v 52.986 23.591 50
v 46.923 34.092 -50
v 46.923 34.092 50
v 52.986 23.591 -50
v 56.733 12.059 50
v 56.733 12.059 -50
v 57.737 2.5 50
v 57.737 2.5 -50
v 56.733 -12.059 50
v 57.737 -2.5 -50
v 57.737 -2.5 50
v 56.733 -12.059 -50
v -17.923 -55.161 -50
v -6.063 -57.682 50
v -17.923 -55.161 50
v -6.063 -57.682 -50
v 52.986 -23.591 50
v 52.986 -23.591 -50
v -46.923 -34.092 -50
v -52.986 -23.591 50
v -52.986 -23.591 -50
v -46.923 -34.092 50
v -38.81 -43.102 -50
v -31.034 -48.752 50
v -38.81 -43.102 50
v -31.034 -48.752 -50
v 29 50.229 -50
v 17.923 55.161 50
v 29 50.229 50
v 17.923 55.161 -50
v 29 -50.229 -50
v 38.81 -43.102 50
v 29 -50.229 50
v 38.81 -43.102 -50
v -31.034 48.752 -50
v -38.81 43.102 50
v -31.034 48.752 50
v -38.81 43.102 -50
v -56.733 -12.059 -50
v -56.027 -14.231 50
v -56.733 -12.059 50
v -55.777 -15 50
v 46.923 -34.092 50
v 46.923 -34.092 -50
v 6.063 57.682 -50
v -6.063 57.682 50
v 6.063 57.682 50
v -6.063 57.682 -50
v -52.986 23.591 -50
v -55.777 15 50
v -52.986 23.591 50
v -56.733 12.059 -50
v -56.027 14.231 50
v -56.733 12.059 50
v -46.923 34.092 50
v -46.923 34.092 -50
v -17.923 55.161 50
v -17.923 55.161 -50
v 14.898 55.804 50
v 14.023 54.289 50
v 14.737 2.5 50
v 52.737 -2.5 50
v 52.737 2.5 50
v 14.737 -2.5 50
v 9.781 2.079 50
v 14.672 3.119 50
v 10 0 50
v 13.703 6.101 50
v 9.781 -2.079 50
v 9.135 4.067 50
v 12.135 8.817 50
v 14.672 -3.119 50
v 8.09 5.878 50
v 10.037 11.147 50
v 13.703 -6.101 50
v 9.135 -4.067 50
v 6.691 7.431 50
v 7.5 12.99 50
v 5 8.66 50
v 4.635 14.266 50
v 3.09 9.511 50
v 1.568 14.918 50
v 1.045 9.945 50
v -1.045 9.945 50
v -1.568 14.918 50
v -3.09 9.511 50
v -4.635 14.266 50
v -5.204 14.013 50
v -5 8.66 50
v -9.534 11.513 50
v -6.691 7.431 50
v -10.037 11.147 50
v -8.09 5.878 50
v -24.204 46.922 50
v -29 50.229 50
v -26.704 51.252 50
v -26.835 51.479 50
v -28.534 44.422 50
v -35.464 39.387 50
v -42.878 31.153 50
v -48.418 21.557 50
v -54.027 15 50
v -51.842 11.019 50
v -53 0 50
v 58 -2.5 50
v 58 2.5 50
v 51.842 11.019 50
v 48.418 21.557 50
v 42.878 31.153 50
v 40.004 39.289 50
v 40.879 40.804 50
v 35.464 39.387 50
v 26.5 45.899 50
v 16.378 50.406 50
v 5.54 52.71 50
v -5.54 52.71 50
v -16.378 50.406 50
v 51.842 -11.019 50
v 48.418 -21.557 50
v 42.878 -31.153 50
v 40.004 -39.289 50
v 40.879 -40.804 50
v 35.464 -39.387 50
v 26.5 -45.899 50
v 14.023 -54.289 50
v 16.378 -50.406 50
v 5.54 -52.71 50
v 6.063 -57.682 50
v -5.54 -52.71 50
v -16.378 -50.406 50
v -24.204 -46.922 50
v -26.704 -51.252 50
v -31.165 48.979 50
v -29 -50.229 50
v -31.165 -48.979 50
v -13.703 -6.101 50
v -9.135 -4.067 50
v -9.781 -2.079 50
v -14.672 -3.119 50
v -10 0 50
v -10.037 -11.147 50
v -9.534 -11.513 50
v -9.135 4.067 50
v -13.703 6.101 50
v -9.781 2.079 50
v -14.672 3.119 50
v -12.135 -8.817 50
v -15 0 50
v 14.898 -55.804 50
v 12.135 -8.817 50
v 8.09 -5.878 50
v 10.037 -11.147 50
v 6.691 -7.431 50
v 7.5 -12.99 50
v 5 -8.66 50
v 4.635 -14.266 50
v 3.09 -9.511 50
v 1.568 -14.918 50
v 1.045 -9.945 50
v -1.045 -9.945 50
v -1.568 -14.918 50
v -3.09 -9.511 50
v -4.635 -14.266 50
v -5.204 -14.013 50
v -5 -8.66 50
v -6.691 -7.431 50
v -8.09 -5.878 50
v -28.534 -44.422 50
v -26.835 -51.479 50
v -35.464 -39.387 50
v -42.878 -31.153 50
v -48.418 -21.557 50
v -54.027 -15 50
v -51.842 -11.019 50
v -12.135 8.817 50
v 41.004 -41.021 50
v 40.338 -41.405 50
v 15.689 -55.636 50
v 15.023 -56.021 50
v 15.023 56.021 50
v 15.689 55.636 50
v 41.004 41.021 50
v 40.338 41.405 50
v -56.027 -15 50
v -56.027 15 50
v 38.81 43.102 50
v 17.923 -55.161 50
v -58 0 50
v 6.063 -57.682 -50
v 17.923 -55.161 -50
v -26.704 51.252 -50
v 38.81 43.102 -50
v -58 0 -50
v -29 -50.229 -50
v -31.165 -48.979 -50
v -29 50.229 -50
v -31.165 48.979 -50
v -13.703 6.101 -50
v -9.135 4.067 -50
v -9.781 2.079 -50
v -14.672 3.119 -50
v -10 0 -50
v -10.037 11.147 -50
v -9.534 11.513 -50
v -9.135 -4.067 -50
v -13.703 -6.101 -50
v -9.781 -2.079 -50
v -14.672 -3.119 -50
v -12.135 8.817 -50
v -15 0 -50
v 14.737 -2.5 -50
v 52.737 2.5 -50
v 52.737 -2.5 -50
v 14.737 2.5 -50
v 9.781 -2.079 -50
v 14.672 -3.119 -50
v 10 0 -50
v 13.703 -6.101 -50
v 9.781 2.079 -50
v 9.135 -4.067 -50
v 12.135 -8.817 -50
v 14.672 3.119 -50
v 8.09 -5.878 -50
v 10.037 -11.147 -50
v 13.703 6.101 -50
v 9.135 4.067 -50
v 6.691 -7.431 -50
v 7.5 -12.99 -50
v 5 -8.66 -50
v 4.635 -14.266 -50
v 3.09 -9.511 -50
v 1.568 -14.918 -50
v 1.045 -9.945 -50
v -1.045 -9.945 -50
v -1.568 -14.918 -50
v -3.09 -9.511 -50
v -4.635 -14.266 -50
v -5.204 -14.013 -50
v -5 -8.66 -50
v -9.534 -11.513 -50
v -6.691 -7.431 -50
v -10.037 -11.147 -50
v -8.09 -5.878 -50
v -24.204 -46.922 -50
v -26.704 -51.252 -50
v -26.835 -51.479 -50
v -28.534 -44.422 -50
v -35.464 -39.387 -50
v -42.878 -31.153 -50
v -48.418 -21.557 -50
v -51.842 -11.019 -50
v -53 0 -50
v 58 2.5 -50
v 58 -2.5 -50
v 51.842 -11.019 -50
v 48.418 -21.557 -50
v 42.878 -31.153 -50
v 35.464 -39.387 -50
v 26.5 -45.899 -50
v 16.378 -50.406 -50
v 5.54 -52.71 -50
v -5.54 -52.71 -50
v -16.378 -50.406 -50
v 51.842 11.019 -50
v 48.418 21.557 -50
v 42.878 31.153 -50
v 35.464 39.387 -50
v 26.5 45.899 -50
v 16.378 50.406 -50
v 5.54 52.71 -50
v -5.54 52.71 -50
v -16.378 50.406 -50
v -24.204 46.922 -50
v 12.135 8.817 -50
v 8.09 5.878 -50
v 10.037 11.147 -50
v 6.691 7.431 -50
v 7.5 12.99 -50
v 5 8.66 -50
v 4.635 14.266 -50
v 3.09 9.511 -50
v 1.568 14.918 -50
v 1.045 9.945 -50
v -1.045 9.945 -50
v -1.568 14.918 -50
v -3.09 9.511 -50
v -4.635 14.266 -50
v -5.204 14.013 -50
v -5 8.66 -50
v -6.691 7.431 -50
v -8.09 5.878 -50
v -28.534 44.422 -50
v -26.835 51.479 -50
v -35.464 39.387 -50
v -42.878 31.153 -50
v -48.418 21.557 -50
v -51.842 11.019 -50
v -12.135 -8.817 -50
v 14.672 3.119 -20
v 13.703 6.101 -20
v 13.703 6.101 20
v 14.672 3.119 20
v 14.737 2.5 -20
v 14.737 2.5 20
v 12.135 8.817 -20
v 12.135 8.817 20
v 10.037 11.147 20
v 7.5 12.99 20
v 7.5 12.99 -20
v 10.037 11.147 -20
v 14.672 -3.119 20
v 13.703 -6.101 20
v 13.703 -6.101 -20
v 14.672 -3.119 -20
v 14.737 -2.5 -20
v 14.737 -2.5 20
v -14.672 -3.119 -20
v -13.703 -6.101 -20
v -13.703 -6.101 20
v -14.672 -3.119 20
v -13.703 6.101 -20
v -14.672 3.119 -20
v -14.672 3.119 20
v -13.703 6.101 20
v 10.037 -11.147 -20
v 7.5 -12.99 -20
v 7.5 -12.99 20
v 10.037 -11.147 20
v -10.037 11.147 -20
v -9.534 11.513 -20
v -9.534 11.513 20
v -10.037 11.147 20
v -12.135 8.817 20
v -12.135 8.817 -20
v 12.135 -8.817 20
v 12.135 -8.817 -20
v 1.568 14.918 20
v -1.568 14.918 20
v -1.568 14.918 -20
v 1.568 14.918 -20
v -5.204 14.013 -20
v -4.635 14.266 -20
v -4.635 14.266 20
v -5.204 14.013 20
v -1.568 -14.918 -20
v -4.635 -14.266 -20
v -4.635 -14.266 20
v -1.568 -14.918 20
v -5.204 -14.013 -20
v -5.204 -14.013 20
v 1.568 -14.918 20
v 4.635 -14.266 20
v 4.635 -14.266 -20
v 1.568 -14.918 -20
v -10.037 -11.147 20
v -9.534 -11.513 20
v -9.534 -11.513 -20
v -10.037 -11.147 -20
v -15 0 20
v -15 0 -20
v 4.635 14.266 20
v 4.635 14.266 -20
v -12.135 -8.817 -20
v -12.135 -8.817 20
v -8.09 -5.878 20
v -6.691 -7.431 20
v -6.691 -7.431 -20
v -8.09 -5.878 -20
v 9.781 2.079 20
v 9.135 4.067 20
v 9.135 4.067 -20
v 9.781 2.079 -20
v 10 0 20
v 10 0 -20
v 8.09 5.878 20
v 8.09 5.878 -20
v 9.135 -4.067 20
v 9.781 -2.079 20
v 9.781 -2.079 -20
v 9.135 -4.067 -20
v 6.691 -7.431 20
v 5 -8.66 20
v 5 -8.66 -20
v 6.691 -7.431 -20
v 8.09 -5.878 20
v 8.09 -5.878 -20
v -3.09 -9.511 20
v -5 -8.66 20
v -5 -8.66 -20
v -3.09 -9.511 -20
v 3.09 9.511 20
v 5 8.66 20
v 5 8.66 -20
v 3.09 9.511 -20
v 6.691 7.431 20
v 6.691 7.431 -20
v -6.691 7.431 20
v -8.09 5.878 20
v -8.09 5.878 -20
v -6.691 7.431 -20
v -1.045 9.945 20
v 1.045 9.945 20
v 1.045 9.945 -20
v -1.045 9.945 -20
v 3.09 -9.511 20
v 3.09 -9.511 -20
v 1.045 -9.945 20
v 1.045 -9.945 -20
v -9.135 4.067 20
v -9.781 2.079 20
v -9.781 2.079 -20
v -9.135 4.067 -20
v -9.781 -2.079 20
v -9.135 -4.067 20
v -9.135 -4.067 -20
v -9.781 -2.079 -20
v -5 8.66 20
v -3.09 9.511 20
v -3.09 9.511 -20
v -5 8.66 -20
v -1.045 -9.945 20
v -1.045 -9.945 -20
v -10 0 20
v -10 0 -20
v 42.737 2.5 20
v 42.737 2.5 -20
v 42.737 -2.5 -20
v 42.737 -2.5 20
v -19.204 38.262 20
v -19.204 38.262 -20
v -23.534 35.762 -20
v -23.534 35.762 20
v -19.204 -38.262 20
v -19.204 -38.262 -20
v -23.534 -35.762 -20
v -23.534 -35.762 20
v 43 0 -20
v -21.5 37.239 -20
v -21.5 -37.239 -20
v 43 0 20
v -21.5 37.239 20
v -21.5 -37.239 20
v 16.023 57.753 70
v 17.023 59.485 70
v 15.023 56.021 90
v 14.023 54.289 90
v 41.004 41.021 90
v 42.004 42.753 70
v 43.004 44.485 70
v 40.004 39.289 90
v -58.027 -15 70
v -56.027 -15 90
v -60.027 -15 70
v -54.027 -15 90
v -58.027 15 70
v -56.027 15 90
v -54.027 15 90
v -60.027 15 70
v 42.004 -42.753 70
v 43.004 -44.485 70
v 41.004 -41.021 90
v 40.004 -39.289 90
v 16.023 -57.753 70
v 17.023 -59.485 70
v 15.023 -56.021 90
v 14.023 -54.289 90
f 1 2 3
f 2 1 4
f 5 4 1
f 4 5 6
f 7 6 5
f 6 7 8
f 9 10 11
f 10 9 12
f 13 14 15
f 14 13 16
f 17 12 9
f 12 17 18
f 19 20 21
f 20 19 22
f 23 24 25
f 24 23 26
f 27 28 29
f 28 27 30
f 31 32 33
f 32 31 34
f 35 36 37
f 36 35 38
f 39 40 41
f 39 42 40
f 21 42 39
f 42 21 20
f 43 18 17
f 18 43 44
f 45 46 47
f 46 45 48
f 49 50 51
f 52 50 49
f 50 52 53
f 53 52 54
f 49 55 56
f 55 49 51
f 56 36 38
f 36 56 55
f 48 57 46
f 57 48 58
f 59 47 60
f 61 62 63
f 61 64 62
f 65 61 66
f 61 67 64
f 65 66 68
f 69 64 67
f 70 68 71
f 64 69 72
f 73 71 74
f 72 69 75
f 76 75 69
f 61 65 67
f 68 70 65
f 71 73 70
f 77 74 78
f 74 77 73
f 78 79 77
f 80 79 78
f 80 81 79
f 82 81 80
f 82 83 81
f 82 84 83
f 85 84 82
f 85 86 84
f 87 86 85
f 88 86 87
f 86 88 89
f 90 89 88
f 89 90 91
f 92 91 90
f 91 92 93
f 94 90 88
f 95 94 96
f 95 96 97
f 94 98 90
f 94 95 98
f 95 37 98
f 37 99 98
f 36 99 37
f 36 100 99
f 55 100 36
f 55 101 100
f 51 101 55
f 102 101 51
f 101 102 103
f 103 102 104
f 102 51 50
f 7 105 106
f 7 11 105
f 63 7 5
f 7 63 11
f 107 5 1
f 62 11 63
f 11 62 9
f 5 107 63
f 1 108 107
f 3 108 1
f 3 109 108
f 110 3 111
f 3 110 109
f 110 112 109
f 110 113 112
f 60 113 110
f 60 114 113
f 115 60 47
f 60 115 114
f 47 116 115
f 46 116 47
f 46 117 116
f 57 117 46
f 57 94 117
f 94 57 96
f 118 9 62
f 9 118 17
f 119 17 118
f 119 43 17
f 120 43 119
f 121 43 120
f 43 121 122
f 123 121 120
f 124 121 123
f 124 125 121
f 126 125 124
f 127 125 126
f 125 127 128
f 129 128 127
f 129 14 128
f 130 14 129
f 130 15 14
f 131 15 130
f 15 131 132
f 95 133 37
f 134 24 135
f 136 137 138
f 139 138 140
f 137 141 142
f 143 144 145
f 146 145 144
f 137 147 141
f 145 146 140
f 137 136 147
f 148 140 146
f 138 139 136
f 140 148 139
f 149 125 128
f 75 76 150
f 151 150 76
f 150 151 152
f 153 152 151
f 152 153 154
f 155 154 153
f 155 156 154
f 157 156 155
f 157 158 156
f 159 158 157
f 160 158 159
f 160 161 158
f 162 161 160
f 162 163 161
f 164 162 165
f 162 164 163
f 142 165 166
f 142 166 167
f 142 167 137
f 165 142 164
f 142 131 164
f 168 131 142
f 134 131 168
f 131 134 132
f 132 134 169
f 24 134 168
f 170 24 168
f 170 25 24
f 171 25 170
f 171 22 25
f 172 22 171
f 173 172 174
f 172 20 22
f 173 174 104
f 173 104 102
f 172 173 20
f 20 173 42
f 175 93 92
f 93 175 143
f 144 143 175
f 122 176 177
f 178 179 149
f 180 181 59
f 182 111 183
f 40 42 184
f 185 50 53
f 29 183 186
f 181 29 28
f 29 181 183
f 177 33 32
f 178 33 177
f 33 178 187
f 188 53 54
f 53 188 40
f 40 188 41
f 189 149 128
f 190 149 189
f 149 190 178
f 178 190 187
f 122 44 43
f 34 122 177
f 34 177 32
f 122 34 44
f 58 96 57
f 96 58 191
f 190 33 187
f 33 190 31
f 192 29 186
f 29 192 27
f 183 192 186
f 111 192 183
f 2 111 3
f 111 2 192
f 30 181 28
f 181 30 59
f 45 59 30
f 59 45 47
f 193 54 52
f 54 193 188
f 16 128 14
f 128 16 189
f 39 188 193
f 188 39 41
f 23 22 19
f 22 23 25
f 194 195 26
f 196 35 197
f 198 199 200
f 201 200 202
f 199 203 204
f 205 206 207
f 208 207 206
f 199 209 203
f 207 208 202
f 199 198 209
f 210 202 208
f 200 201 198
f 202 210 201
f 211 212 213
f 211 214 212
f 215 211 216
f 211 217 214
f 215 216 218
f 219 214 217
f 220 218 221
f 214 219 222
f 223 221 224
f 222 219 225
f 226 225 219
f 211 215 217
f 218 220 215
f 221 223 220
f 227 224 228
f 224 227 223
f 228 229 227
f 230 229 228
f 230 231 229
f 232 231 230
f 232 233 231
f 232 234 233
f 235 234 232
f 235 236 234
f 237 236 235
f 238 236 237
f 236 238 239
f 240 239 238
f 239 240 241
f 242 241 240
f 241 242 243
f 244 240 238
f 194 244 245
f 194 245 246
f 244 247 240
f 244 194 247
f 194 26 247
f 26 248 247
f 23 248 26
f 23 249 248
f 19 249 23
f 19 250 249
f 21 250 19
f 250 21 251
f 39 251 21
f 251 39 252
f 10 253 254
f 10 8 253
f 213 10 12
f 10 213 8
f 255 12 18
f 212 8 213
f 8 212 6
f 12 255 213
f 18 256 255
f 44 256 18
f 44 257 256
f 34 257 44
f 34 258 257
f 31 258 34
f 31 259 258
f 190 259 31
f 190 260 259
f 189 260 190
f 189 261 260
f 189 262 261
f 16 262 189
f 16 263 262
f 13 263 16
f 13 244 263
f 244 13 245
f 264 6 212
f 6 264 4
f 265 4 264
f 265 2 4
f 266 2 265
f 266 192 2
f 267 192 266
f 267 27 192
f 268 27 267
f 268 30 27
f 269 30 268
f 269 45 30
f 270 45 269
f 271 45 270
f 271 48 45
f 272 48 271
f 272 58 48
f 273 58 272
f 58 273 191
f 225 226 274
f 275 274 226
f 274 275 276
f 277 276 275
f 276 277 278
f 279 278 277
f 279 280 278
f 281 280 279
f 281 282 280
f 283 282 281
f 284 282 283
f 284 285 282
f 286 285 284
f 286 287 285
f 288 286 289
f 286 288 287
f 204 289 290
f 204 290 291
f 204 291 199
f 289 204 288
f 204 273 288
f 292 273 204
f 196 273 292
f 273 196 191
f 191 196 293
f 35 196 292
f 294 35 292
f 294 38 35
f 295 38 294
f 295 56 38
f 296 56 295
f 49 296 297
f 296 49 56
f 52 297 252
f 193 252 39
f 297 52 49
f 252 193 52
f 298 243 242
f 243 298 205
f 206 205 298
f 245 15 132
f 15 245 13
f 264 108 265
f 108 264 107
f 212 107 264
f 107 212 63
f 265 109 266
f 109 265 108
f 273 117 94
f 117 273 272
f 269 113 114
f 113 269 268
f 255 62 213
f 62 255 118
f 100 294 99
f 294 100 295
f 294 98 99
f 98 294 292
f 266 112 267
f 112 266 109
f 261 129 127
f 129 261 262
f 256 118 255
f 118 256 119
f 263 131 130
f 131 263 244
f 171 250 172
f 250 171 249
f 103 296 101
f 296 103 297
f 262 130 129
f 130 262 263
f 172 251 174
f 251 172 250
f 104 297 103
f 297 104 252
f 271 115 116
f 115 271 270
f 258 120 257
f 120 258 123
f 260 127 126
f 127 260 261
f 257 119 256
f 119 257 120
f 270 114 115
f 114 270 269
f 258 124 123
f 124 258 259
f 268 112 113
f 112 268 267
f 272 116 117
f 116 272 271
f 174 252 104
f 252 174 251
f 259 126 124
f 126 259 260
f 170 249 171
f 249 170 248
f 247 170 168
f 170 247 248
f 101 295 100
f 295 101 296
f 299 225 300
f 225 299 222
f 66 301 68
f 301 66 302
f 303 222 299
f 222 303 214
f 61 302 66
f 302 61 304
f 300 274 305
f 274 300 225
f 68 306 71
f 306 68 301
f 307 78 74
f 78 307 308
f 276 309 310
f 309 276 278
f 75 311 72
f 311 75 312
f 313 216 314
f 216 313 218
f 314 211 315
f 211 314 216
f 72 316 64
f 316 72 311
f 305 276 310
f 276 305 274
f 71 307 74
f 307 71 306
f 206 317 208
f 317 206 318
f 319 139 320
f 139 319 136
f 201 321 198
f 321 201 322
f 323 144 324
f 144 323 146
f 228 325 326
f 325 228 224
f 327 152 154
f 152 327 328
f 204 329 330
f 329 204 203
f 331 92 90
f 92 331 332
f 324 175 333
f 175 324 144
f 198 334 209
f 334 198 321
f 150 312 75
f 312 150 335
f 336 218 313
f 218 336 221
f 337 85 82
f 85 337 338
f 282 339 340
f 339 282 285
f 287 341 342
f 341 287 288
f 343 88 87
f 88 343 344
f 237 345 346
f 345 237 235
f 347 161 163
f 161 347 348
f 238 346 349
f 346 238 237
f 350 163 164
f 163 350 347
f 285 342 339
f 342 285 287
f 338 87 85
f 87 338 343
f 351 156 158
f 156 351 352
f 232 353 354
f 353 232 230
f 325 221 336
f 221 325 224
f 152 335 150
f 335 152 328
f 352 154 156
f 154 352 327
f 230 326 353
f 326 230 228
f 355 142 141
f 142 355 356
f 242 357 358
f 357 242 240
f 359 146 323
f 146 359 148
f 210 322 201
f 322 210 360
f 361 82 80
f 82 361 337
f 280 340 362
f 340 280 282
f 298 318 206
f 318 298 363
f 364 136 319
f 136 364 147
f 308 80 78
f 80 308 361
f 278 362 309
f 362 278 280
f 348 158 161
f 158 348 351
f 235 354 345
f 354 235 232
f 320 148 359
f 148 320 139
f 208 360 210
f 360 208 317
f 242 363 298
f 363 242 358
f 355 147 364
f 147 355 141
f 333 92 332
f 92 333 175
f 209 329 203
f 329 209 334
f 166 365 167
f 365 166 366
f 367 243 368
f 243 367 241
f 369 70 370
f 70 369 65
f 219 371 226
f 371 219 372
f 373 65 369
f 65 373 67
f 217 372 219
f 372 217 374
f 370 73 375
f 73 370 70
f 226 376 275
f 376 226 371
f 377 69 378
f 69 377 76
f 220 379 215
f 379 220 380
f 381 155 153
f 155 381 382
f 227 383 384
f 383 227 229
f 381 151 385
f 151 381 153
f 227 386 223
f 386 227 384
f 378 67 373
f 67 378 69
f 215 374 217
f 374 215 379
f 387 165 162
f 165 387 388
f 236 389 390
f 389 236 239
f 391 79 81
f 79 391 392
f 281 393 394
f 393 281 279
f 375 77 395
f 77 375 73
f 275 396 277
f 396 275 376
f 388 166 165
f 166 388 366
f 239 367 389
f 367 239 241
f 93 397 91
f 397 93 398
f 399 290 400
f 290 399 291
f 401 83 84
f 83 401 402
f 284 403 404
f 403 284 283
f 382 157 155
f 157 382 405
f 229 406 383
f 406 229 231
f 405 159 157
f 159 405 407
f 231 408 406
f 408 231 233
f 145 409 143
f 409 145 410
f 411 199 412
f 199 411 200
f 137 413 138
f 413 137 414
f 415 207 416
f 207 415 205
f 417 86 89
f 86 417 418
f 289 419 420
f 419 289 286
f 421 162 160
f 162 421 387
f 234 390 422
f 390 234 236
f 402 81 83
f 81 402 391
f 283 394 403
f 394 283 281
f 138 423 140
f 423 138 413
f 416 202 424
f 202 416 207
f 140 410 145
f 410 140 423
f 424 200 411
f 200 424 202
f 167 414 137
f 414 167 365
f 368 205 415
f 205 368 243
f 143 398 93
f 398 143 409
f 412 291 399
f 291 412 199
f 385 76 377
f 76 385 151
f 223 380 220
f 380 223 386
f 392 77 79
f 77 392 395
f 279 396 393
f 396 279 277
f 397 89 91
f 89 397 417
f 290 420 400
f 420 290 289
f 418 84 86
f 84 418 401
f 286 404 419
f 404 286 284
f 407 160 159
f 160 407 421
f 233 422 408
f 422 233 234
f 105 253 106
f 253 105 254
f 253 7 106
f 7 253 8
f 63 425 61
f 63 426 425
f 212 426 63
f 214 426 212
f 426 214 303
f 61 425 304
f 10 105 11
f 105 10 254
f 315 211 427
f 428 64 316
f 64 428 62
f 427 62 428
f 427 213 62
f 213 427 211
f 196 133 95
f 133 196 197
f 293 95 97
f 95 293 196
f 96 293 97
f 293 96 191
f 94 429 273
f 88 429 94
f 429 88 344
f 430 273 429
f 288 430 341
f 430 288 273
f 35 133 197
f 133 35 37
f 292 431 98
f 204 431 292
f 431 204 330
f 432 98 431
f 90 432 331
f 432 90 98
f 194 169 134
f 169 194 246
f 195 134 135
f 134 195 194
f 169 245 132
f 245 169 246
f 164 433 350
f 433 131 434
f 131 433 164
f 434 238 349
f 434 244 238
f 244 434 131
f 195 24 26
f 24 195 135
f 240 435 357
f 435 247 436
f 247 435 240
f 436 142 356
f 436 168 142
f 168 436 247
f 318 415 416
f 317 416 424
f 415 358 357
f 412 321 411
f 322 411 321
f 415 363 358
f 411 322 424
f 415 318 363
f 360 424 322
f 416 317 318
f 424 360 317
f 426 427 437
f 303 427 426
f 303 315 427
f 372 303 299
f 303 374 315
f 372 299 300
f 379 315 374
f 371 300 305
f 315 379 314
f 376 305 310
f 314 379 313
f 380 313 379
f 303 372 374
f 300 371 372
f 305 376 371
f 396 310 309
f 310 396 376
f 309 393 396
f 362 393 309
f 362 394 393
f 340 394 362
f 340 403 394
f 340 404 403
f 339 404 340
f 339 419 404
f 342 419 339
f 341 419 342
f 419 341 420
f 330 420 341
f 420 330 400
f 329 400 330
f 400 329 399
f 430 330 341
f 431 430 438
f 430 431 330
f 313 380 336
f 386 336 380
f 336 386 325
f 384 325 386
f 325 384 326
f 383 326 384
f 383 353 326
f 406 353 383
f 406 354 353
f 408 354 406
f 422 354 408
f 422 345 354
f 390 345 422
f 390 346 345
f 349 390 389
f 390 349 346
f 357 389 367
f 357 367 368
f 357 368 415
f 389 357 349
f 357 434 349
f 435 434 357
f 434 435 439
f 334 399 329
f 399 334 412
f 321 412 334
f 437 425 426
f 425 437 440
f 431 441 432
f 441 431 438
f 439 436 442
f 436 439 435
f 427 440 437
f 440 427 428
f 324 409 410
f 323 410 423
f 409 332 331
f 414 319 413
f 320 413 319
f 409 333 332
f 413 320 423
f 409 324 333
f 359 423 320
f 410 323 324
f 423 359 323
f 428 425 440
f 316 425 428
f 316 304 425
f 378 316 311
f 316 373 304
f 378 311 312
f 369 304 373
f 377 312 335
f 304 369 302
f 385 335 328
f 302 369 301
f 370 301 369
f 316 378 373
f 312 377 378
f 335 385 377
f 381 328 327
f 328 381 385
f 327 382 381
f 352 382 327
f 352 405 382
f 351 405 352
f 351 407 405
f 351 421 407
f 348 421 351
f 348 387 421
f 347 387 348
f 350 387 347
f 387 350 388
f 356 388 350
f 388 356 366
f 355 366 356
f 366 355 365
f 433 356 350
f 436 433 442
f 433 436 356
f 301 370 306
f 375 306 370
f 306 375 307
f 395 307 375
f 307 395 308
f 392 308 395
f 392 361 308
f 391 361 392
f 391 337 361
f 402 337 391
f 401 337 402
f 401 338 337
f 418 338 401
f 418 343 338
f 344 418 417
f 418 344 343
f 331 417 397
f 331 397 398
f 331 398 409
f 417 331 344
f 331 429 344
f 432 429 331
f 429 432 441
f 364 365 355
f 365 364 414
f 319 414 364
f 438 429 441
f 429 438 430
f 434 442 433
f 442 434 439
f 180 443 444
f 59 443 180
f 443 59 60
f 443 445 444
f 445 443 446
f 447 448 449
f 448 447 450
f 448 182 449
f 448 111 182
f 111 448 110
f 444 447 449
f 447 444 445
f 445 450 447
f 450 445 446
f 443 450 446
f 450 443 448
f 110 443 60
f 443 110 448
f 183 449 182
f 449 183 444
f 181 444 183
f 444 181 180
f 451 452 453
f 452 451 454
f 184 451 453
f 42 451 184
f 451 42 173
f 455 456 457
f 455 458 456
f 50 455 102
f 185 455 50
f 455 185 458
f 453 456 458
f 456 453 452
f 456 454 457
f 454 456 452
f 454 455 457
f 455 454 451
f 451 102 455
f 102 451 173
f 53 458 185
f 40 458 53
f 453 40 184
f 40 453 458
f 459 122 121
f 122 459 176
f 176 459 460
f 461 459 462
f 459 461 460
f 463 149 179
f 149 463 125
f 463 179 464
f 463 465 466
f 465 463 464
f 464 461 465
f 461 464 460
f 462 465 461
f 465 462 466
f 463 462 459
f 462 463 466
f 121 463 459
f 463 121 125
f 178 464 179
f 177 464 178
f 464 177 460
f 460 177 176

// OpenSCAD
/*  OpenSCAD input script
 *  Created using Claude AI with lot of instructions and fixes.
 *  
 *  TODO: smooth the springs both vertival and horizontal.
 * 
 */


// SCAD parameter "face number" to approximate ciylinders
$fn = 30;

// Parameters
height = 100;
outer_diameter = 116;
inner_diameter = 20;
wall_thickness = 5;
num_ribs = 3;
cut_diameter = outer_diameter - 30;
rib_height = 30;

// Spring parameters
spring_thickness = 2;
spring_height = 40;
spring_width = 30;
spring_extension = 4;

// Derived parameters
outer_radius = outer_diameter / 2;
inner_radius = inner_diameter / 2;
middle_radius = (outer_radius + inner_radius) / 2;
cut_radius = cut_diameter / 2;

// Calculated spring position
function chord_height(r, w) = r - sqrt(r*r - (w/2)*(w/2));
spring_chord_height = chord_height(outer_radius, spring_width);
spring_offset = outer_radius - spring_thickness/2 - spring_chord_height;

// Outer cylinder shell
module outer_shell() {
    difference() {
        cylinder(h = height, r = outer_radius, center = true);
        cylinder(h = height + 1, r = outer_radius - wall_thickness, center = true);
    }
}

// Inner cylinder shell
module inner_shell() {
    difference() {
        cylinder(h = height, r = inner_radius + wall_thickness, center = true);
        cylinder(h = height + 1, r = inner_radius, center = true);
    }
}

// Single rib
module rib() {
    cube([outer_radius - inner_radius, wall_thickness, height], center = true);
}

// Cut cylinder
module cut_cylinder() {
    cylinder(h = height - 2*rib_height, r = cut_radius, center = true);
}

// Single spring - box approximation
module spring_approx() {
    cube([spring_thickness, spring_width, spring_height], center = true);
}

// Simple planar spring (vertically bent)
module spring() {
    points = [
        [-spring_thickness/2, -spring_height/2],
        [spring_thickness/2, -spring_height/2],
        [spring_thickness/2 + spring_extension, 0],  // Bend point
        [spring_thickness/2, spring_height/2],
        [-spring_thickness/2, spring_height/2],
        [-spring_thickness/2 + spring_extension, 0]  // Bend point on the other side
    ];
    rotate([90, 0, 0])
    linear_extrude(height = spring_width, center = true) {
        polygon(points);
    }
}

// Main assembly
module main_assembly() {
    difference() {
        union() {
            outer_shell();
            inner_shell();
            for (i = [0:num_ribs-1]) {
                angle = i * 360 / num_ribs;
                rotate([0, 0, angle])
                translate([middle_radius, 0, 0])
                rib();
            }
        }
        cut_cylinder();
    }
    
    // Add springs
    for (i = [0:num_ribs-1]) {
        angle = i * 360 / num_ribs + 180 / num_ribs;  // Offset by half the angle between ribs
        rotate([0, 0, angle])
        translate([spring_offset, 0, height/2 + spring_height/2])
        spring();
    }
}

// Render the assembly
main_assembly();
